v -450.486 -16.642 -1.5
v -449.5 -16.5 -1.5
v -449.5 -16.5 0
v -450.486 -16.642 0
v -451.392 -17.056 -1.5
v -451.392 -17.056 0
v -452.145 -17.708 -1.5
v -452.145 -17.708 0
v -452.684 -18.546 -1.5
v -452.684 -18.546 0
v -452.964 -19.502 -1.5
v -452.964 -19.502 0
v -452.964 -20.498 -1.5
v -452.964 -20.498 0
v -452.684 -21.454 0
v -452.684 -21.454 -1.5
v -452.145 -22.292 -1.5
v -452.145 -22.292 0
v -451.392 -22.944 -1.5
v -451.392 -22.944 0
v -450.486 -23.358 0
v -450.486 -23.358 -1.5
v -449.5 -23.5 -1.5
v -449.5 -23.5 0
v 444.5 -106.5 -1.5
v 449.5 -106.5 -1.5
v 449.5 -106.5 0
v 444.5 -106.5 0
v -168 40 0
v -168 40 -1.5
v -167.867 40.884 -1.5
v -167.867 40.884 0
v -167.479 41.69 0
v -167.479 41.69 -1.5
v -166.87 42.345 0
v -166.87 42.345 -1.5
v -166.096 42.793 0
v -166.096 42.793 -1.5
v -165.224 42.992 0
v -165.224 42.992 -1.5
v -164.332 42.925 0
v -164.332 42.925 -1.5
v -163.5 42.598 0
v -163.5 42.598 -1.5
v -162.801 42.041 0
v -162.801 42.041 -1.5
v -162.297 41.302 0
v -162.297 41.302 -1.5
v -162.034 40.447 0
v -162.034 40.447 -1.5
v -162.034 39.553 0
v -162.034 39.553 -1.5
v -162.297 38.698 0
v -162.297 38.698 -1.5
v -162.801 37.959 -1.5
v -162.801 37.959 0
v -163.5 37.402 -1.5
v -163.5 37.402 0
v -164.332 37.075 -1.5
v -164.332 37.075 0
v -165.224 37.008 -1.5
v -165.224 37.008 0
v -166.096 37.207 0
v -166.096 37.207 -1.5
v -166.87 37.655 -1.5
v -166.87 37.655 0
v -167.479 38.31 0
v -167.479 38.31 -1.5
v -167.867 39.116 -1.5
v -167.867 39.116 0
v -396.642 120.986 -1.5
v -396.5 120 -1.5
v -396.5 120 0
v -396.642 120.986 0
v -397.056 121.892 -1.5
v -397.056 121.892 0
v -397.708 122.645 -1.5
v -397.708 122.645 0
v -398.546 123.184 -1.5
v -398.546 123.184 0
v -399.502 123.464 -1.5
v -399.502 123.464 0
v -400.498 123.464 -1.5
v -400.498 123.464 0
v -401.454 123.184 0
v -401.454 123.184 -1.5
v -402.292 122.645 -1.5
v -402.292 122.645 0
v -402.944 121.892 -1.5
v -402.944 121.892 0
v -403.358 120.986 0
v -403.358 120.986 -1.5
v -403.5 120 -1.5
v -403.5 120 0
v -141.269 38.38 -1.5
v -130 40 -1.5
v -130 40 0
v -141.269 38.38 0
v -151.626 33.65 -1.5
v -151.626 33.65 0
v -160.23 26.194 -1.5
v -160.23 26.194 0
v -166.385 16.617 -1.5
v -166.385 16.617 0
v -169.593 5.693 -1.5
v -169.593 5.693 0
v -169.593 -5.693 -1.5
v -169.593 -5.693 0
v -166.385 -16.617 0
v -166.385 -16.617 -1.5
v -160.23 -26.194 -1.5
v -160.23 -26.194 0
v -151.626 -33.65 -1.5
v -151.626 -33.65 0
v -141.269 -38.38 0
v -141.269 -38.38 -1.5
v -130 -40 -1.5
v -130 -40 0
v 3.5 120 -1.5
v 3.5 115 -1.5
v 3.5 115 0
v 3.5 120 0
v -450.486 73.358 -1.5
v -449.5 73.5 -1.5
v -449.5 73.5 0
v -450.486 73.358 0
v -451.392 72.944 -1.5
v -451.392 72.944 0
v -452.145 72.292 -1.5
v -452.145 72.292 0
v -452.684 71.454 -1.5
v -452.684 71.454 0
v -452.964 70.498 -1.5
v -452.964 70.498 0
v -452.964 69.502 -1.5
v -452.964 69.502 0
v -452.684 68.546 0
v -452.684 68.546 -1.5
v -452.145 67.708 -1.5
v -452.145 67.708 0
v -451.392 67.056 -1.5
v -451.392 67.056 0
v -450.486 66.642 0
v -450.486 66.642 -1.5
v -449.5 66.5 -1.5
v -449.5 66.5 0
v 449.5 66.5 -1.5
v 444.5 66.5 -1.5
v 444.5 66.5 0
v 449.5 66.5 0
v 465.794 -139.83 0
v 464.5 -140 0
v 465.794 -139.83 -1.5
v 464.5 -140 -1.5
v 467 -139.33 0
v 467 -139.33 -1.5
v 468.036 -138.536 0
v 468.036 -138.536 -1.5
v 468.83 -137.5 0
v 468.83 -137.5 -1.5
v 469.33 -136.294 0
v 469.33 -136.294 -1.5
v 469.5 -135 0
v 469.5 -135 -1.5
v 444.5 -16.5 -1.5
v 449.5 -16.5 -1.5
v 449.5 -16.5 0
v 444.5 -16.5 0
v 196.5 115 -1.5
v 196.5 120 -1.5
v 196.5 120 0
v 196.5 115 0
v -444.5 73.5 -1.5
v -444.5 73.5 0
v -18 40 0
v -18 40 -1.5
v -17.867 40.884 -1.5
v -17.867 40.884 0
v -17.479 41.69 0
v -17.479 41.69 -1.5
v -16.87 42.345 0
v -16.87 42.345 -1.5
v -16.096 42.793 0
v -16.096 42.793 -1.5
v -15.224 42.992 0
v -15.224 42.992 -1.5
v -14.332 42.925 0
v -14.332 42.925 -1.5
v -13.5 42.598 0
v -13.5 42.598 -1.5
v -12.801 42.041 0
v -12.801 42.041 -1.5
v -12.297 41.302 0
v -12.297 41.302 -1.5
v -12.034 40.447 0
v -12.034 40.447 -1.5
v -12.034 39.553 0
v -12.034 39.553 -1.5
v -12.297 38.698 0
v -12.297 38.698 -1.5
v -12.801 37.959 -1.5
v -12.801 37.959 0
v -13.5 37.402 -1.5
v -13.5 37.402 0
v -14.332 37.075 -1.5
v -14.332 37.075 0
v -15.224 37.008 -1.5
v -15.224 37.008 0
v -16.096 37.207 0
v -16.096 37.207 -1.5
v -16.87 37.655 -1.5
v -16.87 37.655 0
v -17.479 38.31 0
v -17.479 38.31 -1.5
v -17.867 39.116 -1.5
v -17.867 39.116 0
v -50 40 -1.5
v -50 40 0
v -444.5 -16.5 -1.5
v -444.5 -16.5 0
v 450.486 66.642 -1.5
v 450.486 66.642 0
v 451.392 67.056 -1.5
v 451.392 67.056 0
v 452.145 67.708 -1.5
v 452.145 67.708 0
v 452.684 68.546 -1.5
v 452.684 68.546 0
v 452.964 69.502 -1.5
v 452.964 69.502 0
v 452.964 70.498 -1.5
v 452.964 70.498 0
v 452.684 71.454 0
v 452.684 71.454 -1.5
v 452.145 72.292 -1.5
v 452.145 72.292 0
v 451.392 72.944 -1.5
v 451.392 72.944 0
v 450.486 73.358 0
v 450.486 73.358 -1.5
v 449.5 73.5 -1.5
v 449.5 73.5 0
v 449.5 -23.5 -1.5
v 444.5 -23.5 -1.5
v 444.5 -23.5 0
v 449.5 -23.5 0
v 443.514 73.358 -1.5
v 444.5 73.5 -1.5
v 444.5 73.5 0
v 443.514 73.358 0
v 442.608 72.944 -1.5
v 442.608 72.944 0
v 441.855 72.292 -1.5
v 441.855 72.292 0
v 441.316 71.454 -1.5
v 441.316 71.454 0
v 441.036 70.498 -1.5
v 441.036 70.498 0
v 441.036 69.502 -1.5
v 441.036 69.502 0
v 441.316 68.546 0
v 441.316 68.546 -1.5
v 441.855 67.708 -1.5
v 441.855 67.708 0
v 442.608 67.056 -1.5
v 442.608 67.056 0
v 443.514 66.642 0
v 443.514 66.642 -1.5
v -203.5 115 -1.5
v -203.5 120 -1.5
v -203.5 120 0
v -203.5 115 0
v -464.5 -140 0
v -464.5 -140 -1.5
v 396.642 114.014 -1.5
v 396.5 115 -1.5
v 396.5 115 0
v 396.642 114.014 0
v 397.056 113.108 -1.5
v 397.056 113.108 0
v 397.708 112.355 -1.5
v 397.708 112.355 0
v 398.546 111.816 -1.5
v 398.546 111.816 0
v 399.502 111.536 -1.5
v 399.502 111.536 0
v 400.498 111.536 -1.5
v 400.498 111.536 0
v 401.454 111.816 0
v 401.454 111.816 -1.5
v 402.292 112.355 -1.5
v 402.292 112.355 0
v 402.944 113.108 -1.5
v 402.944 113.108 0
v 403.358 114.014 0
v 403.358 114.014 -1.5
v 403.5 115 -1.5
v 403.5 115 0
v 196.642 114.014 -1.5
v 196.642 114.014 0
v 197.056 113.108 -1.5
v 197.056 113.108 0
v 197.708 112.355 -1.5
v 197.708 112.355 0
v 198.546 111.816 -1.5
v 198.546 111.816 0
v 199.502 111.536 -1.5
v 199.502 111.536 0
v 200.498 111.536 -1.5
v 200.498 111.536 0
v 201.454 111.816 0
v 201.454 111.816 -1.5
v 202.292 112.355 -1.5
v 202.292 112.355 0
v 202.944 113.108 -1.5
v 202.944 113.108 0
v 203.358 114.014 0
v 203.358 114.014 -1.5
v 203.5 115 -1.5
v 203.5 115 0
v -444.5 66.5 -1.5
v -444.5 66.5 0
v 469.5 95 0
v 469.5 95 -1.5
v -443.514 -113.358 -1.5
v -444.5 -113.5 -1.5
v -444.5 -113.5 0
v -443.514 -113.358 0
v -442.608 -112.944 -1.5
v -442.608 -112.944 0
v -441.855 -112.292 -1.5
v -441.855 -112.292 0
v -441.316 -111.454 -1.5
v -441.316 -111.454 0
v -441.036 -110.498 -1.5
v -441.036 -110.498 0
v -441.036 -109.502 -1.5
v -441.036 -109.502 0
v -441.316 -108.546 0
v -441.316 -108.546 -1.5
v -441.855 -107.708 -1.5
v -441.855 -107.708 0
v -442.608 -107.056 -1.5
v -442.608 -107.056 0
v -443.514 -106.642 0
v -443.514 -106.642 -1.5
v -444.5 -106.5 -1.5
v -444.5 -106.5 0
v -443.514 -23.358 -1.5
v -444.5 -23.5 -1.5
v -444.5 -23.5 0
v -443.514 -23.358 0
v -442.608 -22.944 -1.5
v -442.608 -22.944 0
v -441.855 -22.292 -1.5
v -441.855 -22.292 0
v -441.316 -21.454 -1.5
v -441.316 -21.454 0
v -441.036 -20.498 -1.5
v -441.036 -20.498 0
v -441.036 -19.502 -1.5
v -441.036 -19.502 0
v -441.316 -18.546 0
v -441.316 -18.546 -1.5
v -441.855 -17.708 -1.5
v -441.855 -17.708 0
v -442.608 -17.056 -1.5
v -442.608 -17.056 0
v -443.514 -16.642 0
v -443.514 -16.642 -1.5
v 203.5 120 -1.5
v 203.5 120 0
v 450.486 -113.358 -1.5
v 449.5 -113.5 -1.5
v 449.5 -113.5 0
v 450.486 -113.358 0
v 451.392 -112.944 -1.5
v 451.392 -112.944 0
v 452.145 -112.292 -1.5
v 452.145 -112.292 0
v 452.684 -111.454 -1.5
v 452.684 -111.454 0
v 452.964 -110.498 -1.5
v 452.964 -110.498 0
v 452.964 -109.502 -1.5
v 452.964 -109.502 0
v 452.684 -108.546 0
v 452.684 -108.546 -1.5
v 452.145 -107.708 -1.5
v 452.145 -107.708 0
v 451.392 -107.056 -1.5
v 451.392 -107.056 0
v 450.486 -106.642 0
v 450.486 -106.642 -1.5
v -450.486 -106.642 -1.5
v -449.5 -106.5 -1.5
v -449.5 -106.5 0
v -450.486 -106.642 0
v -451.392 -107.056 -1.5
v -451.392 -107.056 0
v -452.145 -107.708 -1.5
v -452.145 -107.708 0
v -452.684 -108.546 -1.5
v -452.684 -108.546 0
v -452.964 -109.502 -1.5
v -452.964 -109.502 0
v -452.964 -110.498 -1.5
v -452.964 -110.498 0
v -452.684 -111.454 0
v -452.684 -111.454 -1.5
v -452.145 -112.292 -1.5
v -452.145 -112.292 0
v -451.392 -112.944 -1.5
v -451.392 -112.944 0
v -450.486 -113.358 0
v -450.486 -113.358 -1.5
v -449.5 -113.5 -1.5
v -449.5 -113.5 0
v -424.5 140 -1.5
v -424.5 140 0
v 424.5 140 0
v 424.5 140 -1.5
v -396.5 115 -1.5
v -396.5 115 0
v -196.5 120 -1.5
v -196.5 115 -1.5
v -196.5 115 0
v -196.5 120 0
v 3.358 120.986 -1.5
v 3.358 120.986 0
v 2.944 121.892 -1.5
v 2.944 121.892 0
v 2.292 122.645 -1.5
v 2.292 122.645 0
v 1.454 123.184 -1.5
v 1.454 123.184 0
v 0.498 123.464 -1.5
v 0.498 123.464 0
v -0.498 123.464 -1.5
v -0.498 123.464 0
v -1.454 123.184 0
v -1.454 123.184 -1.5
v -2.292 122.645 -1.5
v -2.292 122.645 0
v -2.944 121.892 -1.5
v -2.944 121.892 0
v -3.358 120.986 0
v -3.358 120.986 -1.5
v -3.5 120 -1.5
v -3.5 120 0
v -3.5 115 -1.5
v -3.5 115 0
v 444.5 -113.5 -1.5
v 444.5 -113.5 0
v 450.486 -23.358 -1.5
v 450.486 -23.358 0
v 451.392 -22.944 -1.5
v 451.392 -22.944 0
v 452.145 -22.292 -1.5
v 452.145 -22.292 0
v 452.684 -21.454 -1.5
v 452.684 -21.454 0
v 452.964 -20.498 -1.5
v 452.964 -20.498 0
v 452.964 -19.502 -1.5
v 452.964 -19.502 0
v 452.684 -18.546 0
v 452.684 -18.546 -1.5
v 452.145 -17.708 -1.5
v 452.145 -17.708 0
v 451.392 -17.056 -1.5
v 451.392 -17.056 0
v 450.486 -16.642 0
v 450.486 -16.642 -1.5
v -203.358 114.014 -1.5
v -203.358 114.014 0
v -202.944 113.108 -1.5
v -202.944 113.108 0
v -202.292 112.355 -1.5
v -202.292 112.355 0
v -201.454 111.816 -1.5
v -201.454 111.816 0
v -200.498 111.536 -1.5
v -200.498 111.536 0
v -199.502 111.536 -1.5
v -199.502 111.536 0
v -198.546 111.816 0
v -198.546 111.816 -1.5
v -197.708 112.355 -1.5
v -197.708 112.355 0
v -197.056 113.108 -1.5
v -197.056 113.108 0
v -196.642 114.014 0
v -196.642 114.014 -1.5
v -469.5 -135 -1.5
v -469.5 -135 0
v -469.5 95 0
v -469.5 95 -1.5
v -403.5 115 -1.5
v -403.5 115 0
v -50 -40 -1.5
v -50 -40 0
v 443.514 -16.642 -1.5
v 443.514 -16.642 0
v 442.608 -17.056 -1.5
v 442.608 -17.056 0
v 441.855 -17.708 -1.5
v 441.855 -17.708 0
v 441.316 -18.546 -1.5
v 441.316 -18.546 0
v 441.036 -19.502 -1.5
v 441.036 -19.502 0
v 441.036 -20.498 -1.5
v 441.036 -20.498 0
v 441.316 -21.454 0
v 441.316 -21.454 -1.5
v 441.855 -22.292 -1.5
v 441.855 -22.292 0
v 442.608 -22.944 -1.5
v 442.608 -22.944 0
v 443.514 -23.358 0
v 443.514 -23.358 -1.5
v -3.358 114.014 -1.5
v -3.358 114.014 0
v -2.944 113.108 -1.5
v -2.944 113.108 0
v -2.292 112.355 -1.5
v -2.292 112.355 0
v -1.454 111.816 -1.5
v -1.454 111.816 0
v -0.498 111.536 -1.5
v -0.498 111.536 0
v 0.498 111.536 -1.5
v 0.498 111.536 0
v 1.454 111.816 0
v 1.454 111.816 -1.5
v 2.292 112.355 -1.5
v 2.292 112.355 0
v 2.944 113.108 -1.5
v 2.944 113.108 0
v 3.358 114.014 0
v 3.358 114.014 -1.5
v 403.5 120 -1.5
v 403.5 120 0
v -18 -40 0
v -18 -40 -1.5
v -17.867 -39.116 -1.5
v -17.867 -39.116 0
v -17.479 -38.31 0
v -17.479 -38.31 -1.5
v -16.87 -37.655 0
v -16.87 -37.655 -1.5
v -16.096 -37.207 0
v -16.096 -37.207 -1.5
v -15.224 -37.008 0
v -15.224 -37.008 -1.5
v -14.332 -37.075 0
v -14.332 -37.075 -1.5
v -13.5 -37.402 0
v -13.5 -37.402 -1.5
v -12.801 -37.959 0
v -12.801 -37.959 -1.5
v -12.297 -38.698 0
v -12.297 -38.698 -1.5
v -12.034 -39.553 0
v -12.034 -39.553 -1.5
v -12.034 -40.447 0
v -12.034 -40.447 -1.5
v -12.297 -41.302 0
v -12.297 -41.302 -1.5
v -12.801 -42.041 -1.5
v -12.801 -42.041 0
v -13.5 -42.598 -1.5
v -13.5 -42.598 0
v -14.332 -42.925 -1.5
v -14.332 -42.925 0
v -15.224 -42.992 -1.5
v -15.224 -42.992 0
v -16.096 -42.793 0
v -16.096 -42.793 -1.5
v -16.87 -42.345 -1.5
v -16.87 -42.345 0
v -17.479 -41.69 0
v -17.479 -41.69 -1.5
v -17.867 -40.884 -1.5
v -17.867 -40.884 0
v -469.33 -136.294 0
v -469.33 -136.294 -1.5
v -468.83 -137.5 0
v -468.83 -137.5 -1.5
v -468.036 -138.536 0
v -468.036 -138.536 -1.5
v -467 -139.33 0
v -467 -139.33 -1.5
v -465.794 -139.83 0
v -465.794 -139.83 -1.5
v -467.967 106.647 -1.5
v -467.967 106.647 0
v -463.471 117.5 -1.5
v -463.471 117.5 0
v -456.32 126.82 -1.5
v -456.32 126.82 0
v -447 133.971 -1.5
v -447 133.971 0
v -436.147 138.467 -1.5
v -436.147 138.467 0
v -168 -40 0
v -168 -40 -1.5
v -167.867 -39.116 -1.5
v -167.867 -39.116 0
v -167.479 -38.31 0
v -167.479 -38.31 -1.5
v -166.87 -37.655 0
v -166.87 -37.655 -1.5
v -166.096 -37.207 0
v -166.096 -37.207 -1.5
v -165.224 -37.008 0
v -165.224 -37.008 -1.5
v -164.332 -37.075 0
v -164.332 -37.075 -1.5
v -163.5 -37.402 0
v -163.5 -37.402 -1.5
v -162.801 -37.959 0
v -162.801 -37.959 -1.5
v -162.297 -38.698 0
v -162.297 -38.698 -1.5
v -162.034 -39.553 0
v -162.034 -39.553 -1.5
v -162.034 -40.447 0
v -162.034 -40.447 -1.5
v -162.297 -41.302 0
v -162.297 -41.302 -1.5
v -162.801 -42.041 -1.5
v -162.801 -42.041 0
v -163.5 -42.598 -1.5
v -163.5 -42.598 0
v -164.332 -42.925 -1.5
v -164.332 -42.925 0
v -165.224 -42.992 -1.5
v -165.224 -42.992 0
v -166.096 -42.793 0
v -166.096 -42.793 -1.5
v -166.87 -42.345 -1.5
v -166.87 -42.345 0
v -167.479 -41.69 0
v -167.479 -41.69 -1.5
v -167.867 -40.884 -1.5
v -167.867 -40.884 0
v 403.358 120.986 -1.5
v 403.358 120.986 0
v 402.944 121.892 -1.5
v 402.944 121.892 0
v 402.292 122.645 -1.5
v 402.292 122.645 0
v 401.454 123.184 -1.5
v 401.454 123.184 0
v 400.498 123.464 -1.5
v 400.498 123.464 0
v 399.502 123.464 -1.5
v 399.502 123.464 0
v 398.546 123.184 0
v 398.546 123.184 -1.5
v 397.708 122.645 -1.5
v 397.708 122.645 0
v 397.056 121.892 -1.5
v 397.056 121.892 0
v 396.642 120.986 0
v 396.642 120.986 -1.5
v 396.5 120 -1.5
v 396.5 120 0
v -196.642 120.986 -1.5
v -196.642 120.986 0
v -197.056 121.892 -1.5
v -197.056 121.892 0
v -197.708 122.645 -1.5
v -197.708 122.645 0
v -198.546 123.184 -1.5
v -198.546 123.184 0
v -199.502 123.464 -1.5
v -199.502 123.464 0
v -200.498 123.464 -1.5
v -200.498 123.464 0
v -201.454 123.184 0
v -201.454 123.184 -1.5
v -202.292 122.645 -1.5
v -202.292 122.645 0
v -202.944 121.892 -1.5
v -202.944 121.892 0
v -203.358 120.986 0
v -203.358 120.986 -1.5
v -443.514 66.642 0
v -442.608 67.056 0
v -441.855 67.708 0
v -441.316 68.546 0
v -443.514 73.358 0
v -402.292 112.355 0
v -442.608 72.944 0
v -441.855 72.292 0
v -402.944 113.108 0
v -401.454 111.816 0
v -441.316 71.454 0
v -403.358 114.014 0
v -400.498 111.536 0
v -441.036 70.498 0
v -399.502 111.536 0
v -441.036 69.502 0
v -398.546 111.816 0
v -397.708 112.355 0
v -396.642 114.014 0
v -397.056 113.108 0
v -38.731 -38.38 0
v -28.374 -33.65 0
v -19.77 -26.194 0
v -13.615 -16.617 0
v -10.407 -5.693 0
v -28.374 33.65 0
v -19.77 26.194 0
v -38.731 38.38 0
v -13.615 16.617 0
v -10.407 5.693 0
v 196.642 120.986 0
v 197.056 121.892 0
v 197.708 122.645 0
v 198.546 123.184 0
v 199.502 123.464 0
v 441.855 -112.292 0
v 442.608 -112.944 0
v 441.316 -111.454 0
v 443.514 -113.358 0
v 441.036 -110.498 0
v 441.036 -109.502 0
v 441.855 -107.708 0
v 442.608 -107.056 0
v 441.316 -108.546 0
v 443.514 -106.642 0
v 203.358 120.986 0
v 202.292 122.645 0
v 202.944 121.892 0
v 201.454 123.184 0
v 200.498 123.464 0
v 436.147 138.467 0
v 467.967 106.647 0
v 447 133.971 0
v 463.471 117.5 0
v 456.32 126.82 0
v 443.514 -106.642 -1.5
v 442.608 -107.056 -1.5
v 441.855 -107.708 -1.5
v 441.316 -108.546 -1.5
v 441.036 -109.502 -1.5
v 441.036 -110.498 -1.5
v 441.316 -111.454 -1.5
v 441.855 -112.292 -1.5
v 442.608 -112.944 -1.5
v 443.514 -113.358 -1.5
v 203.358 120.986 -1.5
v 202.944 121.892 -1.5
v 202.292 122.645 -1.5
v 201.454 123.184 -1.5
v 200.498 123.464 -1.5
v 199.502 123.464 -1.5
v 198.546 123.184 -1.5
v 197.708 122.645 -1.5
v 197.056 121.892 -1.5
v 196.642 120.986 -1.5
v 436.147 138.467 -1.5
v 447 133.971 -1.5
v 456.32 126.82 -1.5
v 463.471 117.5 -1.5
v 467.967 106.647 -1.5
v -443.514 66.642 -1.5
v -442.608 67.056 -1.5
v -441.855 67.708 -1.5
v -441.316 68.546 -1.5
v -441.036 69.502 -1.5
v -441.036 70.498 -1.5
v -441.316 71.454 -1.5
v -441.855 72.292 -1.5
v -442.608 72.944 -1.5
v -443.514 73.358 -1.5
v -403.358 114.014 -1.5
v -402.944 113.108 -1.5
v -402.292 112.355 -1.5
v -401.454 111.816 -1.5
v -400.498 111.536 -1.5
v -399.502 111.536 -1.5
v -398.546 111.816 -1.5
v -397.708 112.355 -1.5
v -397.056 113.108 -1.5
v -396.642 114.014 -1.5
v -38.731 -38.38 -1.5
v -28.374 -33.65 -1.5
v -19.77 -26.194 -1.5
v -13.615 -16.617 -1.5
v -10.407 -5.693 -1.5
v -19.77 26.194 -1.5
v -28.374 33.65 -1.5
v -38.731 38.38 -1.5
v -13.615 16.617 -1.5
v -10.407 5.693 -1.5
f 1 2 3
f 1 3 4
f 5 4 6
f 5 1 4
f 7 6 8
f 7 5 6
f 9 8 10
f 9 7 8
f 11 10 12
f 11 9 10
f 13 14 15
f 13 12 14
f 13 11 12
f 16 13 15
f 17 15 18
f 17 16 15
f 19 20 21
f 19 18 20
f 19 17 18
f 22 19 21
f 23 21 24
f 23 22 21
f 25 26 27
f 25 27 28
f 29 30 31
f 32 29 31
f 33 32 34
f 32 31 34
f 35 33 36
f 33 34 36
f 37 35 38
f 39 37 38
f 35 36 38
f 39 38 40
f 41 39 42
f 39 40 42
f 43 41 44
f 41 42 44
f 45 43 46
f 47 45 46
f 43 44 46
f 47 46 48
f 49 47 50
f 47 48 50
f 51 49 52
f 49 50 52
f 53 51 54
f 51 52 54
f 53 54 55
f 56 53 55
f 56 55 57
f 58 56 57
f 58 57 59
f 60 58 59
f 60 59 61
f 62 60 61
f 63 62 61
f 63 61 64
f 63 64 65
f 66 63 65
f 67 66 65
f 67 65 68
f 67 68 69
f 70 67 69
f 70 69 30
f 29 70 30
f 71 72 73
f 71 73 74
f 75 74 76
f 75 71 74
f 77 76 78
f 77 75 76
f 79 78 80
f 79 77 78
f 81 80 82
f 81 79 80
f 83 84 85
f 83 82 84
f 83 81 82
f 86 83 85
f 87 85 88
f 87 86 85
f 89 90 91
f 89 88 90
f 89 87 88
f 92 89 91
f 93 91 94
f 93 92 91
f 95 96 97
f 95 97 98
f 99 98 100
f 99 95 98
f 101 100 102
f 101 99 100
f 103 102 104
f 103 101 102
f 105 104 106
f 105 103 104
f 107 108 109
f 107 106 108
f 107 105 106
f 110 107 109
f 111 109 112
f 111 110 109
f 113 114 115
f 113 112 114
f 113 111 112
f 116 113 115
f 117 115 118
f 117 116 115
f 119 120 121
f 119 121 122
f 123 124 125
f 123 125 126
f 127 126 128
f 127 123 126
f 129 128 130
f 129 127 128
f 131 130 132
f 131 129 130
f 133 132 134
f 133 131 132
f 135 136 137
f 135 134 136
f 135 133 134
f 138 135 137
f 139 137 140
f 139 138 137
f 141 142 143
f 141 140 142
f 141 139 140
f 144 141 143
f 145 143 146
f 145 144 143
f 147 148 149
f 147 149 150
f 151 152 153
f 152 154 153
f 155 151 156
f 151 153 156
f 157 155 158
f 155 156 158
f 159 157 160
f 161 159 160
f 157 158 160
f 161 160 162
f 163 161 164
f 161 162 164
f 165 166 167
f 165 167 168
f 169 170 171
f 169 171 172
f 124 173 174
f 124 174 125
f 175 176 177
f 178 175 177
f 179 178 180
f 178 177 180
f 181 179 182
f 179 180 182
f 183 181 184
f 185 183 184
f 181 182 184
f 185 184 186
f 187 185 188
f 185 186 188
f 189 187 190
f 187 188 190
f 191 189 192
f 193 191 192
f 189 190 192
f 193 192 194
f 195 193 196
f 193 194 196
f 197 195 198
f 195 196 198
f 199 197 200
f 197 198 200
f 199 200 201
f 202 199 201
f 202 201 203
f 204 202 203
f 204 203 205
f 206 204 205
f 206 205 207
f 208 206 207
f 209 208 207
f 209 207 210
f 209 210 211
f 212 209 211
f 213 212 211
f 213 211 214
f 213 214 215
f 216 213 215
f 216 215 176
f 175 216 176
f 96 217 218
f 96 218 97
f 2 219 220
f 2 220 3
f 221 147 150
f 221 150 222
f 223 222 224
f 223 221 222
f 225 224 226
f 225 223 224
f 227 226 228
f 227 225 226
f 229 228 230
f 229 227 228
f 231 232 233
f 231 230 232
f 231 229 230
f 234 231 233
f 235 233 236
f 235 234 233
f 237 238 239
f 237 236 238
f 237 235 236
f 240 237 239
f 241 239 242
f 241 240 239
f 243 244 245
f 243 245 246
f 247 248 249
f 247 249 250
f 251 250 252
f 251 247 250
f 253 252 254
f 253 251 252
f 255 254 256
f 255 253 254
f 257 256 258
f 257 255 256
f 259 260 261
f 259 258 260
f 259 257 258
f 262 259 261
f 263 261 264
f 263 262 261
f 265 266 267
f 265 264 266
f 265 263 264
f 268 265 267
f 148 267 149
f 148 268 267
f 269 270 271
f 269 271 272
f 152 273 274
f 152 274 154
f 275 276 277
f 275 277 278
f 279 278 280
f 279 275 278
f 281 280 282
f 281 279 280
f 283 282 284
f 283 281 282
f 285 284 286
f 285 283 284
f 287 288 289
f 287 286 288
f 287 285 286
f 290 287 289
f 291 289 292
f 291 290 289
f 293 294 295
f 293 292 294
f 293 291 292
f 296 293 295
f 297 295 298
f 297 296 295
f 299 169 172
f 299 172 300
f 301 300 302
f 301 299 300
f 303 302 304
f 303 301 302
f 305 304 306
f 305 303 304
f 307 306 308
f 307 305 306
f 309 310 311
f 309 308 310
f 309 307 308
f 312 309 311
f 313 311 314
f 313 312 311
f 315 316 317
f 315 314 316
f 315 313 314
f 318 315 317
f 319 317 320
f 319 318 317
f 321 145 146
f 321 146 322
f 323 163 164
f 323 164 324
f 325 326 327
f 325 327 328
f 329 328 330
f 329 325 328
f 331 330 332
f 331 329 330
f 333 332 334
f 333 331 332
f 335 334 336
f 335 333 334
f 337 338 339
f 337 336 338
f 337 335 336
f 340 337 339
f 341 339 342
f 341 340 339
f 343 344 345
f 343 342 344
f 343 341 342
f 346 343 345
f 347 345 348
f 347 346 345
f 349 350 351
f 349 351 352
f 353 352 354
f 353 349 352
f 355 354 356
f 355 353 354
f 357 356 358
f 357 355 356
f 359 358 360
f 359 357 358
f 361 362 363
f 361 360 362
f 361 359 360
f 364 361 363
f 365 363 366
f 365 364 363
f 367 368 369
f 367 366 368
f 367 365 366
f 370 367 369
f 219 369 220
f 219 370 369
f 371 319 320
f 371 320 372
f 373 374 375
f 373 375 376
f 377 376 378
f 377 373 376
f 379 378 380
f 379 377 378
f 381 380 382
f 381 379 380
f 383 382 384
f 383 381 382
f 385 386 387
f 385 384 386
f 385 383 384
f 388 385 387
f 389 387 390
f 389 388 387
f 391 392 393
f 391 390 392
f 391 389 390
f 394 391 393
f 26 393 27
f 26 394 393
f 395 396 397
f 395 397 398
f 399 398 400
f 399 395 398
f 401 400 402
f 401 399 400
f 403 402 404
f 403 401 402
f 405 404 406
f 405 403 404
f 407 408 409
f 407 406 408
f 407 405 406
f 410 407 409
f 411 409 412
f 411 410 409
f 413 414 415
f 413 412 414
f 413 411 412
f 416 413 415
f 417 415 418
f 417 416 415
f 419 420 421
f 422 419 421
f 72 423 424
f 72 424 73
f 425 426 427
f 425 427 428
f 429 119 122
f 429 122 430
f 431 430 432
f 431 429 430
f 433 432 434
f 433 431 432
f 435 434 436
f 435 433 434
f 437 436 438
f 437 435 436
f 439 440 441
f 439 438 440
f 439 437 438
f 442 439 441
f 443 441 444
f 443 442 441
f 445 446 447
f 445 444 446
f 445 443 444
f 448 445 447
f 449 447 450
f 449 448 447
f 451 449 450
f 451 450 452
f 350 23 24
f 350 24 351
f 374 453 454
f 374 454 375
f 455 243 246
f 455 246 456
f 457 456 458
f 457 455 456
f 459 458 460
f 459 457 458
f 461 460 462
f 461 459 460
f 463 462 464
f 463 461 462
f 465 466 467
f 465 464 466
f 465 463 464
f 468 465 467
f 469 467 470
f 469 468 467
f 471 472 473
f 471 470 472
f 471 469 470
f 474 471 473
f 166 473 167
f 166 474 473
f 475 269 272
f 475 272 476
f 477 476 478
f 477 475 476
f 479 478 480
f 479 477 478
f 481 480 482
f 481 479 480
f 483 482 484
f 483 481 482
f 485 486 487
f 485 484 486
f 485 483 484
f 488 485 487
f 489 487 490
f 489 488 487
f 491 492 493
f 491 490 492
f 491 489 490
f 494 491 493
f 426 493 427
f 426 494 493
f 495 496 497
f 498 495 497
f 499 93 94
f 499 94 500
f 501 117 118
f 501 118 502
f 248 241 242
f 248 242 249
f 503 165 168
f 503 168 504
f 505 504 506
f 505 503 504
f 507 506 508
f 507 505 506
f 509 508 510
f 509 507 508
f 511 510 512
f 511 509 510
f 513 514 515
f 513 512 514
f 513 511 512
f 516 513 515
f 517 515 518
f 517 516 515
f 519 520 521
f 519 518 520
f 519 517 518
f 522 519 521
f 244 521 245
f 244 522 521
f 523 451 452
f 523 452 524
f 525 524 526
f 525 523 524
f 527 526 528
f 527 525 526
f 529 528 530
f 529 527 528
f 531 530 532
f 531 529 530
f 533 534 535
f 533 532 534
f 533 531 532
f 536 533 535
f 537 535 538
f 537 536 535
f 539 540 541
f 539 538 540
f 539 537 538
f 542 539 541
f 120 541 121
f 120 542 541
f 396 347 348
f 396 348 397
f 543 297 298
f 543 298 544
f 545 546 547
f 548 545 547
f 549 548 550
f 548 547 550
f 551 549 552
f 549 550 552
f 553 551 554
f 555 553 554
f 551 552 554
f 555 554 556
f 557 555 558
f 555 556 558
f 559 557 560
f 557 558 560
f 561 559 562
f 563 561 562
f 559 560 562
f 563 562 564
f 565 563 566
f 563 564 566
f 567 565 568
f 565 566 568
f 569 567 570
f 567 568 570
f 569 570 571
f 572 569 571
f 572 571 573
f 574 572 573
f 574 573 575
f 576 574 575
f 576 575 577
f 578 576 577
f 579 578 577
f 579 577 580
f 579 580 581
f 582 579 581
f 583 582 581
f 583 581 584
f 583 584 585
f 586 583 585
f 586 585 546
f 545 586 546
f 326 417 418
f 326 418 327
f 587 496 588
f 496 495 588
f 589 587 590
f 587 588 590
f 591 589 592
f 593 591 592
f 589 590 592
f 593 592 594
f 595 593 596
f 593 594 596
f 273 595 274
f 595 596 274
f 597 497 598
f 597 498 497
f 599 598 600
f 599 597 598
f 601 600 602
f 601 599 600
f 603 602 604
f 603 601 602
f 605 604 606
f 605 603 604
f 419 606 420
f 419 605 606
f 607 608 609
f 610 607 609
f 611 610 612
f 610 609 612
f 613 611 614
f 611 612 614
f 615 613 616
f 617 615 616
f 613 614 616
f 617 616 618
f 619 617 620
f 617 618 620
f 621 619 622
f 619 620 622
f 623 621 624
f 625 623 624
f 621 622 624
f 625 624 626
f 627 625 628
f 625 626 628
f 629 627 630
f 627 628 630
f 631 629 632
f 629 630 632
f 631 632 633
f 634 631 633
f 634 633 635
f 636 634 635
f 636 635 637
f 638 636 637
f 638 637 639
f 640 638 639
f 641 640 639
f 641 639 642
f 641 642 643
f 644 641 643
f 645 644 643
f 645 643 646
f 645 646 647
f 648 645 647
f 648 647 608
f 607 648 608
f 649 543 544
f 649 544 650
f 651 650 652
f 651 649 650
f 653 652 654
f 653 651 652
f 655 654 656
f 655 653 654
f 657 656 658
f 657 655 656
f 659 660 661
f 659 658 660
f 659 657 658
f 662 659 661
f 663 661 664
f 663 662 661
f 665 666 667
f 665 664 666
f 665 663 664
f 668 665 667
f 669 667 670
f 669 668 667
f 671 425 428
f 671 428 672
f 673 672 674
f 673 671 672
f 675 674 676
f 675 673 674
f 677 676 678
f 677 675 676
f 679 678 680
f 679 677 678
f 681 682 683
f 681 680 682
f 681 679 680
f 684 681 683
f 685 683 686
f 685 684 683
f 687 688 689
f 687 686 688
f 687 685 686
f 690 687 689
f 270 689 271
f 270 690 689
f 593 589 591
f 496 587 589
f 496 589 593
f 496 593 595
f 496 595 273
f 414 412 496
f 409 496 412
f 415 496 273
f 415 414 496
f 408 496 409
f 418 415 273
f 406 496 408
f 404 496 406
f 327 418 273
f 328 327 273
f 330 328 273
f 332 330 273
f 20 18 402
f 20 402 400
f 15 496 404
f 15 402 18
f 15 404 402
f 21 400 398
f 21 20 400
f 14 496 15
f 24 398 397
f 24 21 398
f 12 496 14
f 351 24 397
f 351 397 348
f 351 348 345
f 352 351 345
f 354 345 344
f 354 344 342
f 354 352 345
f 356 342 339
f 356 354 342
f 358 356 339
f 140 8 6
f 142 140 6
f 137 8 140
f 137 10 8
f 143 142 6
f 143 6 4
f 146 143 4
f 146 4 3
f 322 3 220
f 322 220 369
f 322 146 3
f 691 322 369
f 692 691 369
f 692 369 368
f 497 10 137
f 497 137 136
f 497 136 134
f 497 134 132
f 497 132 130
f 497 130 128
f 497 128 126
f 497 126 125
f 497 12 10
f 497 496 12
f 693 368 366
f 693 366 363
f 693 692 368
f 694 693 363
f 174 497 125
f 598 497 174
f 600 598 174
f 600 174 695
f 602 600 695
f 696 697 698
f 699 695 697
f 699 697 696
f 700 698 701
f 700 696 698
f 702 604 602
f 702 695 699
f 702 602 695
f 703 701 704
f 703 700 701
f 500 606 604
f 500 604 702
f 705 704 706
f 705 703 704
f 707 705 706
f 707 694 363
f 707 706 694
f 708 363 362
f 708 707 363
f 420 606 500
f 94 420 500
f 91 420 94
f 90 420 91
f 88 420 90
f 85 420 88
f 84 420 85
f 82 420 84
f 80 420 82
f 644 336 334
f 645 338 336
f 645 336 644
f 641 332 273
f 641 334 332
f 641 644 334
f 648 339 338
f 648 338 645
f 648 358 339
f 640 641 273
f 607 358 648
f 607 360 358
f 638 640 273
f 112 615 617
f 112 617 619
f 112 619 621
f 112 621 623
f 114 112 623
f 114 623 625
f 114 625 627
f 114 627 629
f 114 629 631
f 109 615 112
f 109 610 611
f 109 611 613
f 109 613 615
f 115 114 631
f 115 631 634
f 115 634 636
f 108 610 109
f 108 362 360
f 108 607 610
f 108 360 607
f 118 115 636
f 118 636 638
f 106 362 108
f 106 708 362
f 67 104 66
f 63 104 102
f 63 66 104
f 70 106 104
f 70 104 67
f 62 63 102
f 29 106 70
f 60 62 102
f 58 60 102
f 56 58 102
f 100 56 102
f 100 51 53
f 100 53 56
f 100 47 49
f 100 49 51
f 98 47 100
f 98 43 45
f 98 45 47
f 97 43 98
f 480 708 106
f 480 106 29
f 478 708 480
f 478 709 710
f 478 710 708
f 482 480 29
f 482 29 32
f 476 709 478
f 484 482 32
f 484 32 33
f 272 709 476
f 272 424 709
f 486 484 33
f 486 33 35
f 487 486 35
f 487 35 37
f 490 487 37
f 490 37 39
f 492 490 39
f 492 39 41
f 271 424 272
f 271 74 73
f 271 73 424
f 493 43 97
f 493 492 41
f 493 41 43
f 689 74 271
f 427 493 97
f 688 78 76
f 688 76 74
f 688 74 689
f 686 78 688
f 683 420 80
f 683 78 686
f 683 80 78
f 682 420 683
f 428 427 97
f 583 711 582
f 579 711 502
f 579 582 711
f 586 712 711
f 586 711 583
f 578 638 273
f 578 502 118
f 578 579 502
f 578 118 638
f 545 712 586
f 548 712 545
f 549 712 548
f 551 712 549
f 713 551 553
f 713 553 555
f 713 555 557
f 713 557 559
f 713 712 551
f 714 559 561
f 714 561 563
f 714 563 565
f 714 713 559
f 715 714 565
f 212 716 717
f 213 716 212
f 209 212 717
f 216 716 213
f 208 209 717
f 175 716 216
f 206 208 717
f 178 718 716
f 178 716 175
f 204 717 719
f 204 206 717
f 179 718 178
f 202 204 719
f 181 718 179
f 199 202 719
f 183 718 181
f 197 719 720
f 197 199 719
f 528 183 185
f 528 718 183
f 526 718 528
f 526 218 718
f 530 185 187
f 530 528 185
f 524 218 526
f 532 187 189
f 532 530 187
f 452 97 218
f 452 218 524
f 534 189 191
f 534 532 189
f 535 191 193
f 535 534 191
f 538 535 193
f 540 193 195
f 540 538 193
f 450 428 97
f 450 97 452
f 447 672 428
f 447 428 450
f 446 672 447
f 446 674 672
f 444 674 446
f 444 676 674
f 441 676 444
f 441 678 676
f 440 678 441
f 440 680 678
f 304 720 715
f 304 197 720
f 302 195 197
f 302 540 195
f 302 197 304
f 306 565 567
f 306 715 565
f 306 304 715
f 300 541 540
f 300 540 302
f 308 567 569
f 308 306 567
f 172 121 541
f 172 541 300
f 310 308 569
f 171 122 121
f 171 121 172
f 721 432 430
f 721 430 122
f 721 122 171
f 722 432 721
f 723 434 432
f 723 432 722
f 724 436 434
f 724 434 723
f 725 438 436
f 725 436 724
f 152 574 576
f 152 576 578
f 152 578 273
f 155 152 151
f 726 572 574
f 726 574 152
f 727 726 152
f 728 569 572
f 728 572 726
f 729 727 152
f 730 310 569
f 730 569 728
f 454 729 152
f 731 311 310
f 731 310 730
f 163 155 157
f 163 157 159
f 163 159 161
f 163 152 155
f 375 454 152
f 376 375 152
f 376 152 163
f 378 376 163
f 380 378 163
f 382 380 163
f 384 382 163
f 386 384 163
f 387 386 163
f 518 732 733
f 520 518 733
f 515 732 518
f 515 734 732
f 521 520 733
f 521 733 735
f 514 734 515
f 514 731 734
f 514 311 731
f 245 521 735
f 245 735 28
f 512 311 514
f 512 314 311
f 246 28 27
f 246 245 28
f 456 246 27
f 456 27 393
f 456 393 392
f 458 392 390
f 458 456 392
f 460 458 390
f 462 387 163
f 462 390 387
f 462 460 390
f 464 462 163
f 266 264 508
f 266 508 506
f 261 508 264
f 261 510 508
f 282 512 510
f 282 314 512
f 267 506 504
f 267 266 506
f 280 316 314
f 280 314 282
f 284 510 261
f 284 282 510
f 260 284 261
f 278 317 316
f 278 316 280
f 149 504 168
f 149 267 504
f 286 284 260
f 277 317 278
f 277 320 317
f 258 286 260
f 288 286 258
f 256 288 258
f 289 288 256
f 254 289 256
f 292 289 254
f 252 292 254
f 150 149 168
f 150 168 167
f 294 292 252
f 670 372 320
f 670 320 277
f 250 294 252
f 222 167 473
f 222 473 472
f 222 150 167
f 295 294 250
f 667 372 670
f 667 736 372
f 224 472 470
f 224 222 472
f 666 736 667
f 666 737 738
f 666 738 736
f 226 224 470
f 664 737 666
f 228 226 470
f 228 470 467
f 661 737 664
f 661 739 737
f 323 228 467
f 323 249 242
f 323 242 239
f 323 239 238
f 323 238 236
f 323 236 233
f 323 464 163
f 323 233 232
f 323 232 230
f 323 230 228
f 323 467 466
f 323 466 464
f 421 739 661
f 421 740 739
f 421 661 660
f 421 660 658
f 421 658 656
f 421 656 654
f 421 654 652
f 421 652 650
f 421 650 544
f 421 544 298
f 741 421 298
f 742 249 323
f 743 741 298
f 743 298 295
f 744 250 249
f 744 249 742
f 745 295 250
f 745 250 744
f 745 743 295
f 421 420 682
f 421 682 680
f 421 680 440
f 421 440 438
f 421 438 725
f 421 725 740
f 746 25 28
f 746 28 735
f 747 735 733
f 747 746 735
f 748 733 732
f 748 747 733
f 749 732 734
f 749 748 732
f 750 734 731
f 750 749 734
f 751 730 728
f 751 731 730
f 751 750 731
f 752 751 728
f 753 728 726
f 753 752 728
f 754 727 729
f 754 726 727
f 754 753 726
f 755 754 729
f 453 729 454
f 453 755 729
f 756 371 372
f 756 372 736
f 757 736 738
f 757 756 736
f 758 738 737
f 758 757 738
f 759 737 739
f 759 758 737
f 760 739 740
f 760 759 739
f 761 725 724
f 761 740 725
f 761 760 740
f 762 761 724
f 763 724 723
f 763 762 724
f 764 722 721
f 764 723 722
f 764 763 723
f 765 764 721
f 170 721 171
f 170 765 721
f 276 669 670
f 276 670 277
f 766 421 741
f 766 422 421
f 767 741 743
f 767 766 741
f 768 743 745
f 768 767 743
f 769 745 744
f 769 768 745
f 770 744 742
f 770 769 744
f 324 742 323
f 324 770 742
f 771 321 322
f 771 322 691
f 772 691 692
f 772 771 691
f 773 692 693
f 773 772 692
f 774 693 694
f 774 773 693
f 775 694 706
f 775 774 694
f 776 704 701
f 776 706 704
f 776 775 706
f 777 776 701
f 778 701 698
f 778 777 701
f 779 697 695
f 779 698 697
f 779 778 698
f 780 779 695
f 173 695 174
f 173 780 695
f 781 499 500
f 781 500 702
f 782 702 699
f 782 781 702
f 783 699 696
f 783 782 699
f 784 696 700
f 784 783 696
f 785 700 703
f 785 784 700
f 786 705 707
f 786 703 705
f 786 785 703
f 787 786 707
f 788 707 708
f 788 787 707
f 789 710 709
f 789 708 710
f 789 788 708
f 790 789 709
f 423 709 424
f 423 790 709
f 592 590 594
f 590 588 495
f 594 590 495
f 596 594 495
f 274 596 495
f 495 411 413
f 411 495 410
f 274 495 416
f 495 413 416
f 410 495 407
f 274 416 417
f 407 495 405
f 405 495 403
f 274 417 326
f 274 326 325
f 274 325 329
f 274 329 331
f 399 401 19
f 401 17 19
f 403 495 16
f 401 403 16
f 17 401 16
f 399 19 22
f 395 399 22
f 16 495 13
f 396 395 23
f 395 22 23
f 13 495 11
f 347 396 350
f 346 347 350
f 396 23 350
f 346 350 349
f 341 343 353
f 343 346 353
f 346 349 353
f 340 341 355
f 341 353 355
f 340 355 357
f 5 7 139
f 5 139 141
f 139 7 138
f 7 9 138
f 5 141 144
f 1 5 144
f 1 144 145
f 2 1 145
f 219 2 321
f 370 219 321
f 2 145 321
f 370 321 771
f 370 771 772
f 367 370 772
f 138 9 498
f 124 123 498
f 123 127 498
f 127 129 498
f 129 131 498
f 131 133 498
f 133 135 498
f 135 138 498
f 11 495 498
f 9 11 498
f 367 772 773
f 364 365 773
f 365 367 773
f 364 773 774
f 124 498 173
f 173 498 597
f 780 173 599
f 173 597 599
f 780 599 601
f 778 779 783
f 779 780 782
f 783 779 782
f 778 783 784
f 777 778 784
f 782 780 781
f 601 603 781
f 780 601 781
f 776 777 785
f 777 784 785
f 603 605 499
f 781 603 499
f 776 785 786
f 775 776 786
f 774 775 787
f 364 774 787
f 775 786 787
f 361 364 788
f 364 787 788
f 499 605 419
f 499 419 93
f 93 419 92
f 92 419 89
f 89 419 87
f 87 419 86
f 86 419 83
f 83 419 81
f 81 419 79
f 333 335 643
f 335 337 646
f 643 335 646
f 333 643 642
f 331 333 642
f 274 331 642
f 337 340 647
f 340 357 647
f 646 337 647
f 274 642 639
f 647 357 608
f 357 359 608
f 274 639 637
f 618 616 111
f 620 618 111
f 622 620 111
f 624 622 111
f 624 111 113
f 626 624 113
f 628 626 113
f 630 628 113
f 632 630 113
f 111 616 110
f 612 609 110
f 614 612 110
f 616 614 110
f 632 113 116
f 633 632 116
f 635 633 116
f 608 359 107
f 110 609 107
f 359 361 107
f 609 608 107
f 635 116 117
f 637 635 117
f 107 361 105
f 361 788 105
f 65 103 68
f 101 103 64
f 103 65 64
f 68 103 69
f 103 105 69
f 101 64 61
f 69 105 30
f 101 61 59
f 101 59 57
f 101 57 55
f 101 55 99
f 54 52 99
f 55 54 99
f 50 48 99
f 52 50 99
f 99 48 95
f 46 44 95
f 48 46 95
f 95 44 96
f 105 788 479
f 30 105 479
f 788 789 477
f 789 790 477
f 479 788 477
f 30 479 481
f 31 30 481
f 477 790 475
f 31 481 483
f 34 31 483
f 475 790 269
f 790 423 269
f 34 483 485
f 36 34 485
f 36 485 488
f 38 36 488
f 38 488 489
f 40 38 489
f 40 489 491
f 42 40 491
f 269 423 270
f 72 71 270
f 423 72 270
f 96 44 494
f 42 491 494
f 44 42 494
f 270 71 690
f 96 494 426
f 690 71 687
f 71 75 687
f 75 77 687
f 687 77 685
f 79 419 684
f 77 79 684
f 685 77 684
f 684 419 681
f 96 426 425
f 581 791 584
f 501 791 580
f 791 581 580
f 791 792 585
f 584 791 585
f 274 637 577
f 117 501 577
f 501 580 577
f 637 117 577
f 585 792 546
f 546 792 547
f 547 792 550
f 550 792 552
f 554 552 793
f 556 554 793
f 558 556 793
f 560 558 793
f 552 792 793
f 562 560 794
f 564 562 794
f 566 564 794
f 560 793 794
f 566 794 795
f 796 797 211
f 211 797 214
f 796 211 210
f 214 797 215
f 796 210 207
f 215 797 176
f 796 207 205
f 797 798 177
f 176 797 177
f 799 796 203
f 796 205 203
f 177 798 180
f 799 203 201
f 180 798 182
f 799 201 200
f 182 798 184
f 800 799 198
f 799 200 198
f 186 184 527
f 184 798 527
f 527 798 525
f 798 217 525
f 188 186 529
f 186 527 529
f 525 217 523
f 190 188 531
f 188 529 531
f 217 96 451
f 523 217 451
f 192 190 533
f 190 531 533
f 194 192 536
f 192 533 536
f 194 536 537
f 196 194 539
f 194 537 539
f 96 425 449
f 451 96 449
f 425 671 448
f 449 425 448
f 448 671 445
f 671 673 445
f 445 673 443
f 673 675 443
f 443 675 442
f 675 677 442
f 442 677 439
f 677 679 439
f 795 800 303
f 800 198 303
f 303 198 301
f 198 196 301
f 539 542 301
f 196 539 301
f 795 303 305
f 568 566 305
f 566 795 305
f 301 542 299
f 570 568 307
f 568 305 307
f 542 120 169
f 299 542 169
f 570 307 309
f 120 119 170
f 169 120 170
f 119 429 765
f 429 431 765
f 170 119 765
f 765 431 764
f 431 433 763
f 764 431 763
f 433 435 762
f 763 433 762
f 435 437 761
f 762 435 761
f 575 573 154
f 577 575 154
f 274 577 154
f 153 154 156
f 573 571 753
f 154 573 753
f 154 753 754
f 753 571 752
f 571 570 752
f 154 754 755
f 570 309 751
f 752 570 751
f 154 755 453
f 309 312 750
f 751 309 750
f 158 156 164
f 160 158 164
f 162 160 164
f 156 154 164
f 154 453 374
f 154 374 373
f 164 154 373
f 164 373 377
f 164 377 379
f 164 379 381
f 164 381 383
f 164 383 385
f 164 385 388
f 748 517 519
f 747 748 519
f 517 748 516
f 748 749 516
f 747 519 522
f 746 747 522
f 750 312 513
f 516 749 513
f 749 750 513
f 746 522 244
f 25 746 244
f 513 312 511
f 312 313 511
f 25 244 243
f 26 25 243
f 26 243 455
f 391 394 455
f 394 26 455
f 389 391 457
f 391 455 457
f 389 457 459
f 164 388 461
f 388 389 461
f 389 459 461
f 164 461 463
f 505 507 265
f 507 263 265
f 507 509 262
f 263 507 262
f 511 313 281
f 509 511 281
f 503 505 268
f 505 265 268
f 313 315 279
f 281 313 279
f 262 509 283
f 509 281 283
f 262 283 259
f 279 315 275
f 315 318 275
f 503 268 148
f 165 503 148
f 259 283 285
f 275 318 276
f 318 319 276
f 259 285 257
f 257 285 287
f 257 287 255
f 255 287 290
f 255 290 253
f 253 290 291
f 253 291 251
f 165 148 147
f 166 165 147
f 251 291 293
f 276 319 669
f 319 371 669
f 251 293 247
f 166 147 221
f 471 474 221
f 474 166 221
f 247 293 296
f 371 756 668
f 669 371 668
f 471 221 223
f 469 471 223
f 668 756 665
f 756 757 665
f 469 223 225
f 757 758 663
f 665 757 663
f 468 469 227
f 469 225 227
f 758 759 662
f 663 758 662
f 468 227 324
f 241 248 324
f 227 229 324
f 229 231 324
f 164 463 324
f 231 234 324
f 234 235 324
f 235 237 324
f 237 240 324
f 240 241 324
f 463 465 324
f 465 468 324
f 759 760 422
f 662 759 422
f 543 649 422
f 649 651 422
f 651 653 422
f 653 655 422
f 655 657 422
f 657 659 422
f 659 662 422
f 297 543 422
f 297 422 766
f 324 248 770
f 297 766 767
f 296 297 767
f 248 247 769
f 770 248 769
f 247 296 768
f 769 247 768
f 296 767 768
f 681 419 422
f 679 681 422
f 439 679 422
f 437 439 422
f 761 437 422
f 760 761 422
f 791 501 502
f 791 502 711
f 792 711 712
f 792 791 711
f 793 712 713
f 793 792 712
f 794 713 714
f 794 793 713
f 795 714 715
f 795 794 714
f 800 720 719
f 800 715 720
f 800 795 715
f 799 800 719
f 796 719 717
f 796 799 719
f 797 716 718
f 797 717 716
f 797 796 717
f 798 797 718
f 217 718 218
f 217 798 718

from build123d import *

# Parameters (mm, degrees)
SKETCH_1_W             = 939
SKETCH_1_H             = 280
SM_BASE_FLANGE_1_DEPTH = 1.5
CUT_EXTRUDE_1_DEPTH    = 10
FILLET_1_R             = 45
FILLET_2_R             = 5
CUT_EXTRUDE_2_DEPTH    = 10
PATTERN_LINEAR_1_COUNT = 5
PATTERN_LINEAR_1_PITCH = 200
CUT_EXTRUDE_3_DEPTH    = 10
PATTERN_LINEAR_2_COUNT = 3
PATTERN_LINEAR_2_PITCH = 90
SKETCH_36_R            = 3
CUT_EXTRUDE_4_DEPTH    = 10


# Sheet-metal steps are written as plain solids
with BuildPart() as part:
    # Sketch 1 → 基体-法兰1 (new body)
    with BuildSketch(Plane.XY):
        Rectangle(SKETCH_1_W, SKETCH_1_H)
    extrude(amount=-SM_BASE_FLANGE_1_DEPTH)

    # 草图33 → 切除-拉伸1 (cut)
    with BuildSketch(Plane(origin=(0, 0, -1.5), x_dir=(-1, 0, 0), z_dir=(0, 0, -1))):
        with BuildLine():
            Line((50, 40), (130, 40))
            ThreePointArc((130, 40), (170, 0), (130, -40))
            Line((130, -40), (50, -40))
            ThreePointArc((50, -40), (10, 0), (50, 40))
        make_face()
    extrude(amount=-CUT_EXTRUDE_1_DEPTH, mode=Mode.SUBTRACT)

    # 圆角1
    fillet_1_edges = [part.edges().sort_by_distance(p)[0] for p in [
        (-469.5, 140, -0.75),
        (469.5, 140, -0.75),
    ]]
    fillet(fillet_1_edges, radius=FILLET_1_R)

    # 圆角2
    fillet_2_edges = [part.edges().sort_by_distance(p)[0] for p in [
        (469.5, -140, -0.75),
        (-469.5, -140, -0.75),
    ]]
    fillet(fillet_2_edges, radius=FILLET_2_R)

    # 草图34 → 切除-拉伸2 (cut)
    with BuildSketch(Plane(origin=(0, 0, -1.5), x_dir=(-1, 0, 0), z_dir=(0, 0, -1))):
        with BuildLine():
            Line((-396.5, 120), (-396.5, 115))
            ThreePointArc((-396.5, 115), (-400, 111.5), (-403.5, 115))
            Line((-403.5, 115), (-403.5, 120))
            ThreePointArc((-403.5, 120), (-400, 123.5), (-396.5, 120))
        make_face()
    cut_extrude_2 = extrude(amount=-CUT_EXTRUDE_2_DEPTH, mode=Mode.SUBTRACT)

    # 阵列(线性)1: 切除-拉伸2 ×5
    with Locations(*[(-i * PATTERN_LINEAR_1_PITCH, 0, 0) for i in range(1, PATTERN_LINEAR_1_COUNT)]):
        add(cut_extrude_2, mode=Mode.SUBTRACT)

    # 草图35 → 切除-拉伸3 (cut)
    with BuildSketch(Plane(origin=(0, 0, -1.5), x_dir=(-1, 0, 0), z_dir=(0, 0, -1))):
        with BuildLine():
            Line((-449.5, -106.5), (-444.5, -106.5))
            ThreePointArc((-444.5, -106.5), (-441, -110), (-444.5, -113.5))
            Line((-444.5, -113.5), (-449.5, -113.5))
            ThreePointArc((-449.5, -113.5), (-453, -110), (-449.5, -106.5))
        make_face()
        with BuildLine():
            Line((444.5, -106.5), (449.5, -106.5))
            ThreePointArc((449.5, -106.5), (453, -110), (449.5, -113.5))
            Line((449.5, -113.5), (444.5, -113.5))
            ThreePointArc((444.5, -113.5), (441, -110), (444.5, -106.5))
        make_face()
    cut_extrude_3 = extrude(amount=-CUT_EXTRUDE_3_DEPTH, mode=Mode.SUBTRACT)

    # 阵列(线性)2: 切除-拉伸3 ×3
    with Locations(*[(0, i * PATTERN_LINEAR_2_PITCH, 0) for i in range(1, PATTERN_LINEAR_2_COUNT)]):
        add(cut_extrude_3, mode=Mode.SUBTRACT)

    # 草图36 → 切除-拉伸4 (cut)
    with BuildSketch(Plane(origin=(0, 0, -1.5), x_dir=(-1, 0, 0), z_dir=(0, 0, -1))):
        with Locations((15, 40)):
            Circle(SKETCH_36_R)
        with Locations((165, 40)):
            Circle(SKETCH_36_R)
        with Locations((165, -40)):
            Circle(SKETCH_36_R)
        with Locations((15, -40)):
            Circle(SKETCH_36_R)
    extrude(amount=-CUT_EXTRUDE_4_DEPTH, mode=Mode.SUBTRACT)


solid = part.part
